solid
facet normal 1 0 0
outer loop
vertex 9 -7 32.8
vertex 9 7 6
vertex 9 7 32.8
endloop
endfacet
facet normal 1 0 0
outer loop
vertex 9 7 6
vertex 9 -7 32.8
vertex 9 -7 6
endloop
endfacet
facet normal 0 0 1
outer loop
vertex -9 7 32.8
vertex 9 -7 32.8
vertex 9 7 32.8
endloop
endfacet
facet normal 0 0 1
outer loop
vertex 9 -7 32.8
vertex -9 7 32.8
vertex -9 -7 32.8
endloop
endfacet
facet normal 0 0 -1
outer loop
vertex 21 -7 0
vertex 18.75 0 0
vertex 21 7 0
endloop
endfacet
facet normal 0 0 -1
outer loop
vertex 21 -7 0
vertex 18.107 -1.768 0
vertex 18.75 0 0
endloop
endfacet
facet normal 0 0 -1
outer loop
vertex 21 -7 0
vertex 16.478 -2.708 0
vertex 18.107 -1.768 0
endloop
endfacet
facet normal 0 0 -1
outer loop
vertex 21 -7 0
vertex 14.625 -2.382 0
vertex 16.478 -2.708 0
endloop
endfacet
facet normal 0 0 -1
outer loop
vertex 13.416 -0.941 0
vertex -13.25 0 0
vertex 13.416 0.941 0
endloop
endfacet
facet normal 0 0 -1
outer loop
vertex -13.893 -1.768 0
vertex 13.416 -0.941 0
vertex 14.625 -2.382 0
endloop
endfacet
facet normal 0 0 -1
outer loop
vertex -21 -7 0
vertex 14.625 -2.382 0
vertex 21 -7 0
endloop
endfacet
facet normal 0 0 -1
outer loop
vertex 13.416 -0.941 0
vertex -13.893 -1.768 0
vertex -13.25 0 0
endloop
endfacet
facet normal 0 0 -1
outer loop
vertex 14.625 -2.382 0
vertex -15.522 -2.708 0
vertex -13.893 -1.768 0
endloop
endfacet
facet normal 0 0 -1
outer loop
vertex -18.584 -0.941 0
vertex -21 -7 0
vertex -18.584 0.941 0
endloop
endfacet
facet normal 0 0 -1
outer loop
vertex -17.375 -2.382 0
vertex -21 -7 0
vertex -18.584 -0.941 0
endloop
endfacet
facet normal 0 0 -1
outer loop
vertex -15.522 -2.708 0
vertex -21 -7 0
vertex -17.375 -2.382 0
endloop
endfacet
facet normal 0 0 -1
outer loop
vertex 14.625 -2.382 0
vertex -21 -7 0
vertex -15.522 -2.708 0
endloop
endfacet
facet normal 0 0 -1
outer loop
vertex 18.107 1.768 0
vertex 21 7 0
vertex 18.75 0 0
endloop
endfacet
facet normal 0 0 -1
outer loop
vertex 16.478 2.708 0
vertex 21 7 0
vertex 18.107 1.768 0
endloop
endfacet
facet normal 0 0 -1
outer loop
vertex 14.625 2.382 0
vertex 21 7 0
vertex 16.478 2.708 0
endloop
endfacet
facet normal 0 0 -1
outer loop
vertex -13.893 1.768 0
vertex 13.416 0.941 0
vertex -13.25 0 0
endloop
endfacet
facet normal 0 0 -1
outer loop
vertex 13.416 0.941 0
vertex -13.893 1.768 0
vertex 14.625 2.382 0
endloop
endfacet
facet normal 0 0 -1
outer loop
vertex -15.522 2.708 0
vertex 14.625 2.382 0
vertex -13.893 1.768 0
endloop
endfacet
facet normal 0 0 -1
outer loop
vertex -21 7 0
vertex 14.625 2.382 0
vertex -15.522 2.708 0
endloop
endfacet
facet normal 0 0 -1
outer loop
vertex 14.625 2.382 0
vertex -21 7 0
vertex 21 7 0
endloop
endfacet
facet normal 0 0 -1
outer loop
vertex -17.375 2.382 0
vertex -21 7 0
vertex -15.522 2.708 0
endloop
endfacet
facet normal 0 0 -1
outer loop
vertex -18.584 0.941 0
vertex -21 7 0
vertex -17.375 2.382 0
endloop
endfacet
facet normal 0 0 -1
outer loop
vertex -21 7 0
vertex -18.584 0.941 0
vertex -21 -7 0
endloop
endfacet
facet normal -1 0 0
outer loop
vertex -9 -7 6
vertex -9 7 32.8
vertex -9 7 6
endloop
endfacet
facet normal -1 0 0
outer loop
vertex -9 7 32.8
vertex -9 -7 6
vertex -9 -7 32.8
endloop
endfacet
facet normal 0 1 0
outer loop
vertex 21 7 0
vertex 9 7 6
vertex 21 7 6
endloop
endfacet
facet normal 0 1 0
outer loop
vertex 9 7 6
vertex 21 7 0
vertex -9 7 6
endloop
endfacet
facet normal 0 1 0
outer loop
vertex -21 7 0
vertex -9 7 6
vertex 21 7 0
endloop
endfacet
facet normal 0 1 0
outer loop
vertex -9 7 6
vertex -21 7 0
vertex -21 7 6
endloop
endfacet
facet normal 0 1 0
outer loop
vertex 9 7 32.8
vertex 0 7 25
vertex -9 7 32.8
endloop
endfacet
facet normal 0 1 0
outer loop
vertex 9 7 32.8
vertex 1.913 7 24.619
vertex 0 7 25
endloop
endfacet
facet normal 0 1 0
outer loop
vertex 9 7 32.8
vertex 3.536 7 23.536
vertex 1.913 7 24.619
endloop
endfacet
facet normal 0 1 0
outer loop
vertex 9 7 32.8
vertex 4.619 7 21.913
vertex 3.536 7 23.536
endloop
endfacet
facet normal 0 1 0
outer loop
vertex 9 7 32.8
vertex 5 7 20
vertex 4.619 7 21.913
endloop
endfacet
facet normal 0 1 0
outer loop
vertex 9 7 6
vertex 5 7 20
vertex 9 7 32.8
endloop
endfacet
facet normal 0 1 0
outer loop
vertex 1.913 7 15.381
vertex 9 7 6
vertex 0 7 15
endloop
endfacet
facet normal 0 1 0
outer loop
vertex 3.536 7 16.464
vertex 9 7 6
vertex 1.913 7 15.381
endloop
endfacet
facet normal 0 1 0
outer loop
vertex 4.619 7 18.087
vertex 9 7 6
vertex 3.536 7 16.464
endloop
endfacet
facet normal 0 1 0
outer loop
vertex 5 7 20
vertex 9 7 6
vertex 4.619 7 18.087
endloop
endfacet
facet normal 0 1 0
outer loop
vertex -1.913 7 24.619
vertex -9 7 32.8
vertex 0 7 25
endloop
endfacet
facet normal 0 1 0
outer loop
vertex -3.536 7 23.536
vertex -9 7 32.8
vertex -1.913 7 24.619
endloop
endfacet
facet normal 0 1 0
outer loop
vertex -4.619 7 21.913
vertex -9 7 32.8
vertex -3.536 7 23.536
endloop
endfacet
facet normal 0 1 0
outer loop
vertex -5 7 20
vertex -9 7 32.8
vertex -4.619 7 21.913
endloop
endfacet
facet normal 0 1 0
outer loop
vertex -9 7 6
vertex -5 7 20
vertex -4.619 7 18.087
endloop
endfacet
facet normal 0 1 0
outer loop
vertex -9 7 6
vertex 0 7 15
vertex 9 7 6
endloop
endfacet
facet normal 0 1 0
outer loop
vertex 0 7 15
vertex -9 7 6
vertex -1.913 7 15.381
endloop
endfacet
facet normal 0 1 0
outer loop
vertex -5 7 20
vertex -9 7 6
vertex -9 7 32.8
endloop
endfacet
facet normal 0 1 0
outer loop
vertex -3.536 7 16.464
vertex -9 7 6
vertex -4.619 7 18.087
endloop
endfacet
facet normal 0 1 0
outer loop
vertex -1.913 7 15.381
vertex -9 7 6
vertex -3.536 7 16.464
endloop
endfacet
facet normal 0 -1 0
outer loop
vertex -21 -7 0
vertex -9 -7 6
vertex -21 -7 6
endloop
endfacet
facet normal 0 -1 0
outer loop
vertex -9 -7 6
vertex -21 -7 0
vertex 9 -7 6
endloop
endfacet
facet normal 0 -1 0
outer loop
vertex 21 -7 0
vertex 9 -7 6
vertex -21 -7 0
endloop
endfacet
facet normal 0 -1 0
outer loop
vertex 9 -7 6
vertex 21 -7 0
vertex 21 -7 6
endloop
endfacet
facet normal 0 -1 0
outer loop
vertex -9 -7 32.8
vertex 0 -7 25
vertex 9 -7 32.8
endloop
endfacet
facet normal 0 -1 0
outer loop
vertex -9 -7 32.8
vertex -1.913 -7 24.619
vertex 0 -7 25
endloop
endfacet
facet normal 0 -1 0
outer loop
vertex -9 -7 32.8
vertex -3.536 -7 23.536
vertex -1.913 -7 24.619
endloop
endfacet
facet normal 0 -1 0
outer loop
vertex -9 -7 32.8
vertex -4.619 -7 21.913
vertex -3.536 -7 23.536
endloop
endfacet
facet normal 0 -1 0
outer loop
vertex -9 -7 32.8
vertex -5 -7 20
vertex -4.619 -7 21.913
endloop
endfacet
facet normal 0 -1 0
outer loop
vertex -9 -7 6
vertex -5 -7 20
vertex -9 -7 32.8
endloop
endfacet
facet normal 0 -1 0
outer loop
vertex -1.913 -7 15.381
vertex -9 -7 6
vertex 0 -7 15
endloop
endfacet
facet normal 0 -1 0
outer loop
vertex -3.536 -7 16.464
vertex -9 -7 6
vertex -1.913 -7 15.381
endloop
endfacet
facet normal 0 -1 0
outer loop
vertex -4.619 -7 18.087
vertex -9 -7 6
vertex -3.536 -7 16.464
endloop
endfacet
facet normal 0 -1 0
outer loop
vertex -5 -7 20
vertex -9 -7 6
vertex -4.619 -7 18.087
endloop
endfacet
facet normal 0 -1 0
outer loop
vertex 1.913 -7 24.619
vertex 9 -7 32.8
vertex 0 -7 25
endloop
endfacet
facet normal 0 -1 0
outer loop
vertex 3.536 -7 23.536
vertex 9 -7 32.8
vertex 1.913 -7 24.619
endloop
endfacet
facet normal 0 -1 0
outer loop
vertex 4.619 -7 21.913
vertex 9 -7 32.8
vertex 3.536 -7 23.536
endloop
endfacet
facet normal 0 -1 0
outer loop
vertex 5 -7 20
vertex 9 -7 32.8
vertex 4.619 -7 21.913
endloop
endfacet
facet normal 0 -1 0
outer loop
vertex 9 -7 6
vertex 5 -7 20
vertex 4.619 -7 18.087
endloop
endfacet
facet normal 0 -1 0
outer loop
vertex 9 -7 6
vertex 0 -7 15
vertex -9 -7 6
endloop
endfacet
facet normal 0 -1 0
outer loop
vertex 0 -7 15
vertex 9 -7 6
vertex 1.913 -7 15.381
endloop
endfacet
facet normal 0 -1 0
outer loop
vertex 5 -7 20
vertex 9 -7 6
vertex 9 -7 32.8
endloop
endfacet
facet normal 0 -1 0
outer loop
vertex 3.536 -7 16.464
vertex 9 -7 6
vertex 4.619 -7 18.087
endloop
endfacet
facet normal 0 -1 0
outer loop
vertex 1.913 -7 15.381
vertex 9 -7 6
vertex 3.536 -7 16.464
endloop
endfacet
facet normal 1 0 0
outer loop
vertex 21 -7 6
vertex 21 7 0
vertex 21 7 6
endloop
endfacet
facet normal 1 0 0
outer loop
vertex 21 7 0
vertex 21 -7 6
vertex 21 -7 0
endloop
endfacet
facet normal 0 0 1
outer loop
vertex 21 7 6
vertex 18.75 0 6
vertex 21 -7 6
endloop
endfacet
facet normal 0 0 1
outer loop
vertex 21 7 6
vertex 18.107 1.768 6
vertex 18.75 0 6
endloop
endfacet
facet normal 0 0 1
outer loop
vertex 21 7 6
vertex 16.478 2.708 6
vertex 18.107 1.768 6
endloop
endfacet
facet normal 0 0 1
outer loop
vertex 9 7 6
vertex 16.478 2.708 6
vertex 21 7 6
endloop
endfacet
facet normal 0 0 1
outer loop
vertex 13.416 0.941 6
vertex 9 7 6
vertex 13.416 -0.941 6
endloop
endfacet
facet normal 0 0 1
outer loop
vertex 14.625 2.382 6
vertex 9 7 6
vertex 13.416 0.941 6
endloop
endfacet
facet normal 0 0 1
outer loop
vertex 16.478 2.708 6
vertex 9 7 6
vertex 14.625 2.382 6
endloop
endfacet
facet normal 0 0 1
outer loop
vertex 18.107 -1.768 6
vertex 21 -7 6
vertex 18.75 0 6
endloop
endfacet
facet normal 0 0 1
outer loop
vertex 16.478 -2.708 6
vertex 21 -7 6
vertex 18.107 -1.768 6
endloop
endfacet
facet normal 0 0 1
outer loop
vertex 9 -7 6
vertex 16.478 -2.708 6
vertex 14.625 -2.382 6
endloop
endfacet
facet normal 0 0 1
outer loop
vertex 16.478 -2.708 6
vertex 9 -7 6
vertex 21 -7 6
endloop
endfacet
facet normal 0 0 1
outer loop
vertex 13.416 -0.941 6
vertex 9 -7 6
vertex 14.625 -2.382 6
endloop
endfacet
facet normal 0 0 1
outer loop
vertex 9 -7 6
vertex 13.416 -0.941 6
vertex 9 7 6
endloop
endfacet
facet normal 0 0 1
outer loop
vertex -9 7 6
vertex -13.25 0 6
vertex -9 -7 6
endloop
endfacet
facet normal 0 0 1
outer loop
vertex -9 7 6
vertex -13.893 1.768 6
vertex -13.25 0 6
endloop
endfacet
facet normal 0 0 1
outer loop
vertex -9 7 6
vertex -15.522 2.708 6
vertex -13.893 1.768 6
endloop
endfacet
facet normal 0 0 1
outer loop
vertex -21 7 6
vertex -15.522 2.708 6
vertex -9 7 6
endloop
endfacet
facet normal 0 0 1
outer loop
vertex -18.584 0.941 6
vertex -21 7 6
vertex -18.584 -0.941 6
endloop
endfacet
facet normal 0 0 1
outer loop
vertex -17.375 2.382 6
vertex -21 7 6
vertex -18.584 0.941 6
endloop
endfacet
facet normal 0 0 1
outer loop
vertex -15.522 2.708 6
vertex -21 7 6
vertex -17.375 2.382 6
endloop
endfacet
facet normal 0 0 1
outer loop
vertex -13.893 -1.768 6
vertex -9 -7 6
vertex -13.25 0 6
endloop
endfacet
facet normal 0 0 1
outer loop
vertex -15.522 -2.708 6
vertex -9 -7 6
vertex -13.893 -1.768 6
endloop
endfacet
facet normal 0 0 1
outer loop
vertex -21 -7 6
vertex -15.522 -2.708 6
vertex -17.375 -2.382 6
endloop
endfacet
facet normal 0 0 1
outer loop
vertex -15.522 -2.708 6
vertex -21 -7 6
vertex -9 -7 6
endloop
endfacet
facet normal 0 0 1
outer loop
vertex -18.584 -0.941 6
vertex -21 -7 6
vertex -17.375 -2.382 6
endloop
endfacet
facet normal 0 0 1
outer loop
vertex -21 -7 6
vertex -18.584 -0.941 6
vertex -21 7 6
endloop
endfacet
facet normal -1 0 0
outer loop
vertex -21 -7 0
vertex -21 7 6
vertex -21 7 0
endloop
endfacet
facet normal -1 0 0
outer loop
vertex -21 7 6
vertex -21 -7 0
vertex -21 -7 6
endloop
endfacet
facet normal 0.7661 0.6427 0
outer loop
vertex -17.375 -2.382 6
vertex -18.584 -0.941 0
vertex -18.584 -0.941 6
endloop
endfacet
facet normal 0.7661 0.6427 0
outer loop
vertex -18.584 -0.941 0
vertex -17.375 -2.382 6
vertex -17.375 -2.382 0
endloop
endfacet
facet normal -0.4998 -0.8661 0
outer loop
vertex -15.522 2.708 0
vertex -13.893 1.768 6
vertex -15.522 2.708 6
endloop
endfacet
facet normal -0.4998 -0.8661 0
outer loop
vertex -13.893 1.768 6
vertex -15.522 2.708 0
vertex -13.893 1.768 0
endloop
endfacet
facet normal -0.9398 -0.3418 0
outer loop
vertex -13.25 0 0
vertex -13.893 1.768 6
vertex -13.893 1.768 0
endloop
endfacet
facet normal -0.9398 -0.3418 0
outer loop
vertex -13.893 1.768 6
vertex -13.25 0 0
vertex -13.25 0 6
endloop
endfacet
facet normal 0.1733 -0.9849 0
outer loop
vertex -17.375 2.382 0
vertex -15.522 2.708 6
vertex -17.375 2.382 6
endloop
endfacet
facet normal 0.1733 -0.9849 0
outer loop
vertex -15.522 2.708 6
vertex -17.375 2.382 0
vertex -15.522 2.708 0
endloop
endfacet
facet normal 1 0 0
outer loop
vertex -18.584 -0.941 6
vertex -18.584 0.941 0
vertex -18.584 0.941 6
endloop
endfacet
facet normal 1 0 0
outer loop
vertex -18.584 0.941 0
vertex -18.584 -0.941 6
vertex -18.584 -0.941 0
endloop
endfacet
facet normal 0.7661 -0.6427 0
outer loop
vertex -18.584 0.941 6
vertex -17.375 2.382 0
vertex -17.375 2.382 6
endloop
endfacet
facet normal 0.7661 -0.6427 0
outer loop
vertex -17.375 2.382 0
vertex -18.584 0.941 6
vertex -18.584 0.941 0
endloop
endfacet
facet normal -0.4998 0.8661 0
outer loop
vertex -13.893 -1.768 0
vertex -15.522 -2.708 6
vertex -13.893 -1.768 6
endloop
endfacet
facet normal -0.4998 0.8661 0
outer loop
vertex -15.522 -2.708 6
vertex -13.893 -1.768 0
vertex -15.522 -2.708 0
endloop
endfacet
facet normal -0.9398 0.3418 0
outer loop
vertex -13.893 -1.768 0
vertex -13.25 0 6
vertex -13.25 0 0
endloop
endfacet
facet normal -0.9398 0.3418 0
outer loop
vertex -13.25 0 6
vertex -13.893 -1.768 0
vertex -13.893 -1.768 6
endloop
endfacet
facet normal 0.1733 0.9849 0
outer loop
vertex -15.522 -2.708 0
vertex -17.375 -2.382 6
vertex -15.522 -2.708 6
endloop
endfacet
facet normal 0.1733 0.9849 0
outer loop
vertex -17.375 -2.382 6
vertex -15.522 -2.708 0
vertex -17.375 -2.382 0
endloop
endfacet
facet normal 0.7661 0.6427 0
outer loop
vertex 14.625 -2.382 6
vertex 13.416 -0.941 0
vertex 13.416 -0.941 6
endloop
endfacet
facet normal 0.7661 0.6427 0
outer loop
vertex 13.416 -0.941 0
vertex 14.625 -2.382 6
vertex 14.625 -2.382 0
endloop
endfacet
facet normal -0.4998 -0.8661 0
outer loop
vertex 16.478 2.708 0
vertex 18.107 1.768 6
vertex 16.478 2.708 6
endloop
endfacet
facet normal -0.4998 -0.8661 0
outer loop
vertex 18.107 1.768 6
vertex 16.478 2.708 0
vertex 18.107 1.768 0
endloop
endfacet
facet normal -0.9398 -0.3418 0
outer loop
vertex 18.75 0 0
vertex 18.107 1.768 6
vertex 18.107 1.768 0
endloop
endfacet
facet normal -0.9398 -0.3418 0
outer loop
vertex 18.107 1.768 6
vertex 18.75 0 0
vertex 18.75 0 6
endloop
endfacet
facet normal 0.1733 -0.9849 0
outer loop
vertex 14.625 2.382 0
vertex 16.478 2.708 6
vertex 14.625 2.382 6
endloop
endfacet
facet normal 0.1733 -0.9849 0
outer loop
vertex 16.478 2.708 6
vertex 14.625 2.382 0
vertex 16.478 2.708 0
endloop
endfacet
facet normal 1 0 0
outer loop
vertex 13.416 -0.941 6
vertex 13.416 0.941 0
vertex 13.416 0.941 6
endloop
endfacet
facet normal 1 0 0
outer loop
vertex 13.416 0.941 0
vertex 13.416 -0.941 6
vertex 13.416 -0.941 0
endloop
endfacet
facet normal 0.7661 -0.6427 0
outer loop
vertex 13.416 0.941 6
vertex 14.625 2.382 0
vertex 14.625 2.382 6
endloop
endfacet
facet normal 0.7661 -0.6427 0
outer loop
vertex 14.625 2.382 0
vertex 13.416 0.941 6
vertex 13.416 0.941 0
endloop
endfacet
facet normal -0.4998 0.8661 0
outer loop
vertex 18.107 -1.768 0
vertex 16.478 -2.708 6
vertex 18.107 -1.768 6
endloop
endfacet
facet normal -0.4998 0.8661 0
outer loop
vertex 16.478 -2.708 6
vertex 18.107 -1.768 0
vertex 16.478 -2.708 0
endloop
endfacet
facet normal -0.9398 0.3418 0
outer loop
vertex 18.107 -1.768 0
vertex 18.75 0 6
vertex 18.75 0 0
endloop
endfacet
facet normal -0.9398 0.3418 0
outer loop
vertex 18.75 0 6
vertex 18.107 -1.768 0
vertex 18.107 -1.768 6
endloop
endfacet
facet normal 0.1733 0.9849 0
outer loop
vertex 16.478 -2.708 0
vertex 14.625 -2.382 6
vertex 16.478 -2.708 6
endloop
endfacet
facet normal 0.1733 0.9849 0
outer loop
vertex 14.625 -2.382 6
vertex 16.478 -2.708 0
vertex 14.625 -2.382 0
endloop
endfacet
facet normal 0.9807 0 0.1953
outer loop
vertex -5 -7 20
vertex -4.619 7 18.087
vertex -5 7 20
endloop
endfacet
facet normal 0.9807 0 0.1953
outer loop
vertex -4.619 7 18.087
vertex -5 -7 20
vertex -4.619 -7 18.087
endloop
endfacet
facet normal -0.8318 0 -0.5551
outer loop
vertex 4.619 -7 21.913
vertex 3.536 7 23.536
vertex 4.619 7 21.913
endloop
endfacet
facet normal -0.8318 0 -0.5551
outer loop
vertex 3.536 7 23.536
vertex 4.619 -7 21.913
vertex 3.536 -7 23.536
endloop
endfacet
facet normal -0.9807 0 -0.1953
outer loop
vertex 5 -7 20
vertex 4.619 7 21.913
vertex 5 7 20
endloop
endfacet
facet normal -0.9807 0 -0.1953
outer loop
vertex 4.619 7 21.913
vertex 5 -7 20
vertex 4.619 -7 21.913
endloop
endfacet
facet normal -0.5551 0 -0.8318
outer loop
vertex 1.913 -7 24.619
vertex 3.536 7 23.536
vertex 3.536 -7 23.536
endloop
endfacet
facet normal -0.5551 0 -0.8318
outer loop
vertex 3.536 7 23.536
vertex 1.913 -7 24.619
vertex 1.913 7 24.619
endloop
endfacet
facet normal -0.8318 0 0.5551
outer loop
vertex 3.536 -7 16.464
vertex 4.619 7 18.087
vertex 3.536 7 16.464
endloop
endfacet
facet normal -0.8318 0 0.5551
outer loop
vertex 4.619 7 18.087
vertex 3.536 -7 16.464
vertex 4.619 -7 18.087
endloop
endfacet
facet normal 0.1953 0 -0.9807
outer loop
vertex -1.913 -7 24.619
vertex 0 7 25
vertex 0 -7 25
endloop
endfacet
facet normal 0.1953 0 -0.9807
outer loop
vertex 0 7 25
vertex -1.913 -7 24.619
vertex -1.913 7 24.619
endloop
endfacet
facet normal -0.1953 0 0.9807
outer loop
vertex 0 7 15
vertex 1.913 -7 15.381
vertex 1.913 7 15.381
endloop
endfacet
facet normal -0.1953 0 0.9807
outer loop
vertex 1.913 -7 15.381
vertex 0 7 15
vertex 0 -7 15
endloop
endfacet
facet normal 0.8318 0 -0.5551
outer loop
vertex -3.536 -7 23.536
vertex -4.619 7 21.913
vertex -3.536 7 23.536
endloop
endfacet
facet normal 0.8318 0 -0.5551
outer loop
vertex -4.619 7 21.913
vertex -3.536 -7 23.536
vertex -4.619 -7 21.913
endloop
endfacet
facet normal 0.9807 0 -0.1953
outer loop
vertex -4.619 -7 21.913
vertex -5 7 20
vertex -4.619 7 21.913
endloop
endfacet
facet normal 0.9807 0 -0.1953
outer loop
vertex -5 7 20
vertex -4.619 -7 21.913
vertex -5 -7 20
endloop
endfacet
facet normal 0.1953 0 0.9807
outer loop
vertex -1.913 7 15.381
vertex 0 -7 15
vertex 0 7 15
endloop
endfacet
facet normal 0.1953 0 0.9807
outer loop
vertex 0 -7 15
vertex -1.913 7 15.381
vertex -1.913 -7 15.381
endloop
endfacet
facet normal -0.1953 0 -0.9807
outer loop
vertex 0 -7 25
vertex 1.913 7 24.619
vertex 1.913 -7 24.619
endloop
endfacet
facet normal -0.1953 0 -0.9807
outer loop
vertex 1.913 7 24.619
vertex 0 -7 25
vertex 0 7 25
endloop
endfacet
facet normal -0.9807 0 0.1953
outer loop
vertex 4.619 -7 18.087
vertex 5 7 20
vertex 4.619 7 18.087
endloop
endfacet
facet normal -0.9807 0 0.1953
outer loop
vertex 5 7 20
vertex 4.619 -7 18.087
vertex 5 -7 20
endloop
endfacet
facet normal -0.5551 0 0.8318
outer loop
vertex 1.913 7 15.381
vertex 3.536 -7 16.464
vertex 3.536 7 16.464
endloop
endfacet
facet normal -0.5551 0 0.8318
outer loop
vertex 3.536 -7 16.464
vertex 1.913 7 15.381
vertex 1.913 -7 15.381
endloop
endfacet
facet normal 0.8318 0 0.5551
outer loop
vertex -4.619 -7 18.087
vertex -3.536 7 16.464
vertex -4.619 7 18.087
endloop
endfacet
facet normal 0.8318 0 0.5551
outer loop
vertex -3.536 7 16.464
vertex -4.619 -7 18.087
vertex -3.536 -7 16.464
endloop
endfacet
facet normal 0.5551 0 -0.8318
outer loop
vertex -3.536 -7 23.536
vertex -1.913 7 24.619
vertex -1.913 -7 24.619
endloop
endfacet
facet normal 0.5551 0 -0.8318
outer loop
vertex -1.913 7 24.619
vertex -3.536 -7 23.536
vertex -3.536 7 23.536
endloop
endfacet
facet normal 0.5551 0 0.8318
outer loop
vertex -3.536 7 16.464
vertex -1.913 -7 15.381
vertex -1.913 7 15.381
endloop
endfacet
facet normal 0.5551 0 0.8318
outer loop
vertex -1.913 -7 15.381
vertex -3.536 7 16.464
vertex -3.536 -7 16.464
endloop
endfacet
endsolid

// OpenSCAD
module draw_shaft_tee_support(v)
{
	d=v[0];
	h=v[1];
	w=v[2];
	l=v[3];
	f=v[4];
	g=v[5];
	p=v[6];
	b=v[7];
	s=v[8];

	tab = (w - p) /2;
	center = w / 2;
	mnt_ctr = (w - b) / 2;
	
	translate([-center,-l/2,0])
	difference()
	{
		union()
		{
			cube(size=[tab, l, g], center=false);
			translate(v = [tab, 0, 0])
			{
				cube(size=[p, l, f], center=false);
				translate(v = [p, 0, 0])
				{
					cube(size=[tab, l, g]);
				}
			}
		}
		translate(v = [mnt_ctr, l / 2, g / 2])
		{
			cylinder(h = g * 1.1, r = s / 2, center = true);
		}
		translate(v = [mnt_ctr + b, l / 2, g / 2])
		{
			cylinder(h = g * 1.1, r = s / 2, center = true);
		}
		translate([center, l / 2, h]) rotate([90, 0, 0])
		{
			cylinder(h = l * 1.1, r = d / 2, center = true);
		}
	}
}

module shaft_tee_support(shaft_size)
{
	dims = [
		[8, 20, 42, 14, 32.8, 6, 18, 32, 5.5],
		[10, 20, 42, 14, 32.8, 6, 18, 32, 5.5],
		[12, 23, 42, 14, 37.5, 6, 20, 32, 5.5],
		[13, 23, 42, 14, 37.5, 6, 20, 32, 5.5],
		[16, 27, 48, 16, 44, 8, 25, 38, 5.5],
		[20, 31, 60, 20, 51, 10, 30, 45, 6.6],
		[25, 35, 70, 24, 60, 12, 38, 56, 6.6],
		[30, 42, 84, 28, 70, 12, 44, 64, 9],
		[35, 50, 98, 32, 82, 15, 50, 76, 11],
		[40, 60, 114, 36, 96, 15, 60, 90, 11],
		[50, 70, 126, 40, 120, 18, 74, 100, 14],
		[60, 80, 148, 45, 136, 18, 90, 120, 14]
	];

	i = search(shaft_size, dims, 1, 0)[0];
	draw_shaft_tee_support(dims[i]);
}

shaft_tee_support(10);
